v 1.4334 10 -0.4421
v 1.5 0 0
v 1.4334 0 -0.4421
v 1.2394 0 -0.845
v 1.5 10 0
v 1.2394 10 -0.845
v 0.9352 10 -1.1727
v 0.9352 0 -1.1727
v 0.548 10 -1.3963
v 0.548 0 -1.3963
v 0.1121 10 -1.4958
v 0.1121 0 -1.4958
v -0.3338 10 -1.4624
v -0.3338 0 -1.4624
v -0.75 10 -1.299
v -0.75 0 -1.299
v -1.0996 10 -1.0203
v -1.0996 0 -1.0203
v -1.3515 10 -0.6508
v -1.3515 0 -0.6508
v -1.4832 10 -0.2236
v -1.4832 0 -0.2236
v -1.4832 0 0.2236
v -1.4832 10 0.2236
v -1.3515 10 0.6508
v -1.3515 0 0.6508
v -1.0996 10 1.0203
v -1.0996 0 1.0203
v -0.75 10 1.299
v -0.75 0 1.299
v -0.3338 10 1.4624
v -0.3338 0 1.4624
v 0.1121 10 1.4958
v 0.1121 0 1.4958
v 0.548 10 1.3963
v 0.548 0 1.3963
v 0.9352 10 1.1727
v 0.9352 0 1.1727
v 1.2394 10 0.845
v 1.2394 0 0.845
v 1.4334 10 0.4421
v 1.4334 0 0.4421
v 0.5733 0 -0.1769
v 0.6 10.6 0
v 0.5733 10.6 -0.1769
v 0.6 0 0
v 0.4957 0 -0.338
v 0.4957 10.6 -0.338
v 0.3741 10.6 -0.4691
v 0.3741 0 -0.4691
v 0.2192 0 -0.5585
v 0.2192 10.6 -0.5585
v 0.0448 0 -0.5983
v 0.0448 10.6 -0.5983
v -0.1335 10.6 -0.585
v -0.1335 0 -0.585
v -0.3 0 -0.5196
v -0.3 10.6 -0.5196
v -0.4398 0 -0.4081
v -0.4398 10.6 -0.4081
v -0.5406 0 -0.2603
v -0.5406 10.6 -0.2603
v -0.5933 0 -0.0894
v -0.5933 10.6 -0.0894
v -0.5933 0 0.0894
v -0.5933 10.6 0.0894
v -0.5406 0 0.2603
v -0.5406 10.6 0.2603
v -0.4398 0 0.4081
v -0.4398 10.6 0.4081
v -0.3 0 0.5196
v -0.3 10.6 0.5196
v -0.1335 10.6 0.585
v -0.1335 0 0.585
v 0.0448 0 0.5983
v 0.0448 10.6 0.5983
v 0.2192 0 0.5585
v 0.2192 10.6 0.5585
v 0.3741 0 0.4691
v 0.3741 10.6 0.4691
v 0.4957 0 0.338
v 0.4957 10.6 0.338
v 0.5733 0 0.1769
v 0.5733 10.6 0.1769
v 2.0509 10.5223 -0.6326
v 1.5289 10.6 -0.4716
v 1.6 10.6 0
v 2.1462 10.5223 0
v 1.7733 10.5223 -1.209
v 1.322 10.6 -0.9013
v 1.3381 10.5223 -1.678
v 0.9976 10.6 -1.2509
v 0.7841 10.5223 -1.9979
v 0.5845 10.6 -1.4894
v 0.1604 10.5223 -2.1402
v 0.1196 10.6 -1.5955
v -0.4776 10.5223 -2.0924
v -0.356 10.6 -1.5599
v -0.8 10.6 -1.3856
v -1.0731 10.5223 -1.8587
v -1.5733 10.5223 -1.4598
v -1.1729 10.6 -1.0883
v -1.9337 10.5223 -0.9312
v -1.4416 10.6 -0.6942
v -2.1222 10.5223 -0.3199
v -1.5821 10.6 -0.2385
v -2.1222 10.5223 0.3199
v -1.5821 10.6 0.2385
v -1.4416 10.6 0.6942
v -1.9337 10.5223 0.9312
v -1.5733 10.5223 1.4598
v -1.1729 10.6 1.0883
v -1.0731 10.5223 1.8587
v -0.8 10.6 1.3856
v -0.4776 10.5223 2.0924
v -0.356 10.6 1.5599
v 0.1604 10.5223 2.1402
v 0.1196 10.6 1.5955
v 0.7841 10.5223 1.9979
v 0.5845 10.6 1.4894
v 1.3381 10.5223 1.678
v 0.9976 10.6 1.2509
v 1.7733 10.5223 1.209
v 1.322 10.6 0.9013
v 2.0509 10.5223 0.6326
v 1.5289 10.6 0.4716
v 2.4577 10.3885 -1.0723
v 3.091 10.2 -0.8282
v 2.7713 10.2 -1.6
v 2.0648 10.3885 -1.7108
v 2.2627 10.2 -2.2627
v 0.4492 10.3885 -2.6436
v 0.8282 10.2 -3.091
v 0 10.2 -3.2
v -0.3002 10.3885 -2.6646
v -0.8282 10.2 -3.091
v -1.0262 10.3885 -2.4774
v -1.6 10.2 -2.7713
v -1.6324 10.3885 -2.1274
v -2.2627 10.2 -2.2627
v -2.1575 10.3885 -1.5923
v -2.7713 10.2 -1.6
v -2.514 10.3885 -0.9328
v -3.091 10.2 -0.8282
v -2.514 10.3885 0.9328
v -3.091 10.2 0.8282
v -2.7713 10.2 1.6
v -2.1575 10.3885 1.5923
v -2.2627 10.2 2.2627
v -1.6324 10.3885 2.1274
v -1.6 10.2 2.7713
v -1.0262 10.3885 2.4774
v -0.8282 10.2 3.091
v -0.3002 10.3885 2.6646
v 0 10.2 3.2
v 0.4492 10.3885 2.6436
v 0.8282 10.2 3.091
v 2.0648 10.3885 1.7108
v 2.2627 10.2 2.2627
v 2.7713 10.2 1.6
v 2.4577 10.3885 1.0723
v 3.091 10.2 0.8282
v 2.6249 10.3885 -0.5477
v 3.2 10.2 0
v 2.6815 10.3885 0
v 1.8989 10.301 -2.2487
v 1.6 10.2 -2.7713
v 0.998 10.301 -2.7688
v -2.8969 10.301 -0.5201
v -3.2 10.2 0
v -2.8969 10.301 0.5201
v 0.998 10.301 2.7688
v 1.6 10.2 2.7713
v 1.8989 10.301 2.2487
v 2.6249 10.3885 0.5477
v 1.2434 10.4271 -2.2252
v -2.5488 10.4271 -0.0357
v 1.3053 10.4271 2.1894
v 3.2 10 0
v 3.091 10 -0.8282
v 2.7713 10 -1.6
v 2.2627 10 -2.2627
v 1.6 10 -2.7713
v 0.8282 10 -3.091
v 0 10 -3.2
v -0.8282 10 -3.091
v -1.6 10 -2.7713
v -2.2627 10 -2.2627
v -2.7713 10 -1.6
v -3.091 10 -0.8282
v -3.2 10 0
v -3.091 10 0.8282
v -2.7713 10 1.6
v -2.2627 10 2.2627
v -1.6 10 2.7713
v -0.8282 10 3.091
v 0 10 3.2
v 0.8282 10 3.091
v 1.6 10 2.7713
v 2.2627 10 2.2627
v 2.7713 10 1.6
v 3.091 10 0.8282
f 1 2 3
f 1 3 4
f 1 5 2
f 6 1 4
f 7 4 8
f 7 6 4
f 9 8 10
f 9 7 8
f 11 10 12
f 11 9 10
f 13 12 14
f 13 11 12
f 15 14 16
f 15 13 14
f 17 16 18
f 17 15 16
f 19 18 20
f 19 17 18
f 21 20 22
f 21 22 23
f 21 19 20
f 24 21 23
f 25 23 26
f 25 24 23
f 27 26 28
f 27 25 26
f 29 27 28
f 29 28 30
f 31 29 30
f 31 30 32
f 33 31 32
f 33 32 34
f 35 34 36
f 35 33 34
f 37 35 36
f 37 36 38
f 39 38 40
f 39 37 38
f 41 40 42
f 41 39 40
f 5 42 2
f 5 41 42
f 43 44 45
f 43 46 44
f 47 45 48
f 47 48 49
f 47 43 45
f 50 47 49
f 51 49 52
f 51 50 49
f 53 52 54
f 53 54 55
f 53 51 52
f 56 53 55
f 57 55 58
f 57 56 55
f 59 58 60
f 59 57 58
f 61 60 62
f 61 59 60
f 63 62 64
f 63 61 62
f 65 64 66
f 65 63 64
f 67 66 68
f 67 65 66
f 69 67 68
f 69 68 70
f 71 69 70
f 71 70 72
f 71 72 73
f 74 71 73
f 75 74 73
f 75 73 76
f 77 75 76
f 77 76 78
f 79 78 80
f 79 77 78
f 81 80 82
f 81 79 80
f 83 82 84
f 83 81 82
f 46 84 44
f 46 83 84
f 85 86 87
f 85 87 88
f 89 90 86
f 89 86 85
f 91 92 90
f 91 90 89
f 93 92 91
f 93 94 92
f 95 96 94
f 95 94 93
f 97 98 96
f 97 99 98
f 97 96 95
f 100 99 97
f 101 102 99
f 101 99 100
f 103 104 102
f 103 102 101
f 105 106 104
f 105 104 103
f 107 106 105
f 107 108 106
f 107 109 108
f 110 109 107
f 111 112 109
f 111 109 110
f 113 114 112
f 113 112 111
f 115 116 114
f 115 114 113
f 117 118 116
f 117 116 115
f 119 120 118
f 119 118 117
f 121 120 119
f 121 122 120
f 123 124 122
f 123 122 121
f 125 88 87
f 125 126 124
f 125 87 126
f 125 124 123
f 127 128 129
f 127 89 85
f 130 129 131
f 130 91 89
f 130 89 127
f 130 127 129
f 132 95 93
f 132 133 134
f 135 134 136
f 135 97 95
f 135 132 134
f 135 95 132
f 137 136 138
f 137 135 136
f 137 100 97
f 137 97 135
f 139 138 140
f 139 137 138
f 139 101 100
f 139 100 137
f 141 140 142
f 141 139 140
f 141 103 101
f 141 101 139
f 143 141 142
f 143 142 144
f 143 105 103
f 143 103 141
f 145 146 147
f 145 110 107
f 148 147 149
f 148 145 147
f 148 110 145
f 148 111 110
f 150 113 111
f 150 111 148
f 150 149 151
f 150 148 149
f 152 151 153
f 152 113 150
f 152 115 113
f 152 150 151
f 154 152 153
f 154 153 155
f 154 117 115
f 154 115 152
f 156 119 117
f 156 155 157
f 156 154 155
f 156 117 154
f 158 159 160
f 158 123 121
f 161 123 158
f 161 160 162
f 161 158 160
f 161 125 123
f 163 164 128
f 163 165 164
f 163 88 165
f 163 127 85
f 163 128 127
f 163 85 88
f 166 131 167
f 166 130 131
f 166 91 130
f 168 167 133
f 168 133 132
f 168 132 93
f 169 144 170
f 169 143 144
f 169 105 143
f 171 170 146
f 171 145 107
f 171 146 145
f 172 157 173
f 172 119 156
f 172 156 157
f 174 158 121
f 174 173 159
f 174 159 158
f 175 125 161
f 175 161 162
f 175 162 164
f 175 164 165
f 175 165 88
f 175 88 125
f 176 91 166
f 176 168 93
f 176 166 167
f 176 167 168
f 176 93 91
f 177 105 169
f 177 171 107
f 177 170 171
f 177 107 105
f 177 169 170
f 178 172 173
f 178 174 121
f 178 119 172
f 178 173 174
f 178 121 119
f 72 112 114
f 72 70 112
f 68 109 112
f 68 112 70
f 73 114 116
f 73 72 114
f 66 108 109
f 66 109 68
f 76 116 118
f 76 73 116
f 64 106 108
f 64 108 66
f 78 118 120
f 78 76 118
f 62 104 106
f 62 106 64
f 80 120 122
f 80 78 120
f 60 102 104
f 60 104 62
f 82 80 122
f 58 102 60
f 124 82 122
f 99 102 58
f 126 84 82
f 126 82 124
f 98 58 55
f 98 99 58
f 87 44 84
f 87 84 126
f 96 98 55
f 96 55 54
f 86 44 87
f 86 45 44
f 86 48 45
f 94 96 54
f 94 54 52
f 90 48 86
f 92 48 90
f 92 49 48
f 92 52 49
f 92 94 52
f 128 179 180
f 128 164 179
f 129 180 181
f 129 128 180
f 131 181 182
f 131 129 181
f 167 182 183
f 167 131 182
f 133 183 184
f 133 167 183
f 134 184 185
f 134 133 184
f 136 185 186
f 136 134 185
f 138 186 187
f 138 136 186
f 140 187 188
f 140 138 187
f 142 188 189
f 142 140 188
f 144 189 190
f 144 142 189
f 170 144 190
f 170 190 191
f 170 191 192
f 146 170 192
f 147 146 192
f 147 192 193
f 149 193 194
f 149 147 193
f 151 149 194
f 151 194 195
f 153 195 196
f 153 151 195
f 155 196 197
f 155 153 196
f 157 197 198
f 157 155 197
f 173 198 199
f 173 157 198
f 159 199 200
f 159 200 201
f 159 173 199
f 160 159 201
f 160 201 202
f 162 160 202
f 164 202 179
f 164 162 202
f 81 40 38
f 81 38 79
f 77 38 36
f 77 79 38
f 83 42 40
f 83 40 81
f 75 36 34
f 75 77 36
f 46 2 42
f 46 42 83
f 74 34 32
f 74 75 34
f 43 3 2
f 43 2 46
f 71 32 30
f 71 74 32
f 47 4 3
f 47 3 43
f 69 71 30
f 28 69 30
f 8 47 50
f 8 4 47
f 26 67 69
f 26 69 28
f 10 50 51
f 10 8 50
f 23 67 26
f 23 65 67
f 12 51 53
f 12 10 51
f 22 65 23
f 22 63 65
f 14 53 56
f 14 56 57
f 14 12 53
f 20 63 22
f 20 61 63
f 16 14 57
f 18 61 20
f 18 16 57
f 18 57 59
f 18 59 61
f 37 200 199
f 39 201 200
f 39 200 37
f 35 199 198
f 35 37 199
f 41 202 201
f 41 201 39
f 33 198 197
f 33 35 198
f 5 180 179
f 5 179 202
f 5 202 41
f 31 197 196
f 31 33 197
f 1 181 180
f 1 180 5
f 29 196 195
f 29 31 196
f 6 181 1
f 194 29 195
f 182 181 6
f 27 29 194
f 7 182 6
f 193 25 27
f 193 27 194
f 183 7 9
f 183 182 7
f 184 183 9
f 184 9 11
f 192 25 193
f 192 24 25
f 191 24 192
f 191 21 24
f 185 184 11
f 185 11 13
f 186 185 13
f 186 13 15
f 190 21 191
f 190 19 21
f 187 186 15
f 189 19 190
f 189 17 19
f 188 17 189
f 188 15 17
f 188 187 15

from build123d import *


with BuildPart() as part:
    # Sketch1 → Revolve1 (revolve)
    with BuildSketch(Plane.XY):
        with BuildLine():
            Line((0.6, 0), (1.5, 0))
            Line((1.5, 0), (1.5, 10))
            Line((1.5, 10), (3.2, 10))
            Line((3.2, 10), (3.2, 10.2))
            ThreePointArc((3.2, 10.2), (2.415579075, 10.462316301), (1.6, 10.6))
            Line((1.6, 10.6), (0.6, 10.6))
            Line((0.6, 10.6), (0.6, 0))
        make_face()
    revolve(axis=Axis((0, 0, 0), (0, 1, 0)))


solid = part.part
